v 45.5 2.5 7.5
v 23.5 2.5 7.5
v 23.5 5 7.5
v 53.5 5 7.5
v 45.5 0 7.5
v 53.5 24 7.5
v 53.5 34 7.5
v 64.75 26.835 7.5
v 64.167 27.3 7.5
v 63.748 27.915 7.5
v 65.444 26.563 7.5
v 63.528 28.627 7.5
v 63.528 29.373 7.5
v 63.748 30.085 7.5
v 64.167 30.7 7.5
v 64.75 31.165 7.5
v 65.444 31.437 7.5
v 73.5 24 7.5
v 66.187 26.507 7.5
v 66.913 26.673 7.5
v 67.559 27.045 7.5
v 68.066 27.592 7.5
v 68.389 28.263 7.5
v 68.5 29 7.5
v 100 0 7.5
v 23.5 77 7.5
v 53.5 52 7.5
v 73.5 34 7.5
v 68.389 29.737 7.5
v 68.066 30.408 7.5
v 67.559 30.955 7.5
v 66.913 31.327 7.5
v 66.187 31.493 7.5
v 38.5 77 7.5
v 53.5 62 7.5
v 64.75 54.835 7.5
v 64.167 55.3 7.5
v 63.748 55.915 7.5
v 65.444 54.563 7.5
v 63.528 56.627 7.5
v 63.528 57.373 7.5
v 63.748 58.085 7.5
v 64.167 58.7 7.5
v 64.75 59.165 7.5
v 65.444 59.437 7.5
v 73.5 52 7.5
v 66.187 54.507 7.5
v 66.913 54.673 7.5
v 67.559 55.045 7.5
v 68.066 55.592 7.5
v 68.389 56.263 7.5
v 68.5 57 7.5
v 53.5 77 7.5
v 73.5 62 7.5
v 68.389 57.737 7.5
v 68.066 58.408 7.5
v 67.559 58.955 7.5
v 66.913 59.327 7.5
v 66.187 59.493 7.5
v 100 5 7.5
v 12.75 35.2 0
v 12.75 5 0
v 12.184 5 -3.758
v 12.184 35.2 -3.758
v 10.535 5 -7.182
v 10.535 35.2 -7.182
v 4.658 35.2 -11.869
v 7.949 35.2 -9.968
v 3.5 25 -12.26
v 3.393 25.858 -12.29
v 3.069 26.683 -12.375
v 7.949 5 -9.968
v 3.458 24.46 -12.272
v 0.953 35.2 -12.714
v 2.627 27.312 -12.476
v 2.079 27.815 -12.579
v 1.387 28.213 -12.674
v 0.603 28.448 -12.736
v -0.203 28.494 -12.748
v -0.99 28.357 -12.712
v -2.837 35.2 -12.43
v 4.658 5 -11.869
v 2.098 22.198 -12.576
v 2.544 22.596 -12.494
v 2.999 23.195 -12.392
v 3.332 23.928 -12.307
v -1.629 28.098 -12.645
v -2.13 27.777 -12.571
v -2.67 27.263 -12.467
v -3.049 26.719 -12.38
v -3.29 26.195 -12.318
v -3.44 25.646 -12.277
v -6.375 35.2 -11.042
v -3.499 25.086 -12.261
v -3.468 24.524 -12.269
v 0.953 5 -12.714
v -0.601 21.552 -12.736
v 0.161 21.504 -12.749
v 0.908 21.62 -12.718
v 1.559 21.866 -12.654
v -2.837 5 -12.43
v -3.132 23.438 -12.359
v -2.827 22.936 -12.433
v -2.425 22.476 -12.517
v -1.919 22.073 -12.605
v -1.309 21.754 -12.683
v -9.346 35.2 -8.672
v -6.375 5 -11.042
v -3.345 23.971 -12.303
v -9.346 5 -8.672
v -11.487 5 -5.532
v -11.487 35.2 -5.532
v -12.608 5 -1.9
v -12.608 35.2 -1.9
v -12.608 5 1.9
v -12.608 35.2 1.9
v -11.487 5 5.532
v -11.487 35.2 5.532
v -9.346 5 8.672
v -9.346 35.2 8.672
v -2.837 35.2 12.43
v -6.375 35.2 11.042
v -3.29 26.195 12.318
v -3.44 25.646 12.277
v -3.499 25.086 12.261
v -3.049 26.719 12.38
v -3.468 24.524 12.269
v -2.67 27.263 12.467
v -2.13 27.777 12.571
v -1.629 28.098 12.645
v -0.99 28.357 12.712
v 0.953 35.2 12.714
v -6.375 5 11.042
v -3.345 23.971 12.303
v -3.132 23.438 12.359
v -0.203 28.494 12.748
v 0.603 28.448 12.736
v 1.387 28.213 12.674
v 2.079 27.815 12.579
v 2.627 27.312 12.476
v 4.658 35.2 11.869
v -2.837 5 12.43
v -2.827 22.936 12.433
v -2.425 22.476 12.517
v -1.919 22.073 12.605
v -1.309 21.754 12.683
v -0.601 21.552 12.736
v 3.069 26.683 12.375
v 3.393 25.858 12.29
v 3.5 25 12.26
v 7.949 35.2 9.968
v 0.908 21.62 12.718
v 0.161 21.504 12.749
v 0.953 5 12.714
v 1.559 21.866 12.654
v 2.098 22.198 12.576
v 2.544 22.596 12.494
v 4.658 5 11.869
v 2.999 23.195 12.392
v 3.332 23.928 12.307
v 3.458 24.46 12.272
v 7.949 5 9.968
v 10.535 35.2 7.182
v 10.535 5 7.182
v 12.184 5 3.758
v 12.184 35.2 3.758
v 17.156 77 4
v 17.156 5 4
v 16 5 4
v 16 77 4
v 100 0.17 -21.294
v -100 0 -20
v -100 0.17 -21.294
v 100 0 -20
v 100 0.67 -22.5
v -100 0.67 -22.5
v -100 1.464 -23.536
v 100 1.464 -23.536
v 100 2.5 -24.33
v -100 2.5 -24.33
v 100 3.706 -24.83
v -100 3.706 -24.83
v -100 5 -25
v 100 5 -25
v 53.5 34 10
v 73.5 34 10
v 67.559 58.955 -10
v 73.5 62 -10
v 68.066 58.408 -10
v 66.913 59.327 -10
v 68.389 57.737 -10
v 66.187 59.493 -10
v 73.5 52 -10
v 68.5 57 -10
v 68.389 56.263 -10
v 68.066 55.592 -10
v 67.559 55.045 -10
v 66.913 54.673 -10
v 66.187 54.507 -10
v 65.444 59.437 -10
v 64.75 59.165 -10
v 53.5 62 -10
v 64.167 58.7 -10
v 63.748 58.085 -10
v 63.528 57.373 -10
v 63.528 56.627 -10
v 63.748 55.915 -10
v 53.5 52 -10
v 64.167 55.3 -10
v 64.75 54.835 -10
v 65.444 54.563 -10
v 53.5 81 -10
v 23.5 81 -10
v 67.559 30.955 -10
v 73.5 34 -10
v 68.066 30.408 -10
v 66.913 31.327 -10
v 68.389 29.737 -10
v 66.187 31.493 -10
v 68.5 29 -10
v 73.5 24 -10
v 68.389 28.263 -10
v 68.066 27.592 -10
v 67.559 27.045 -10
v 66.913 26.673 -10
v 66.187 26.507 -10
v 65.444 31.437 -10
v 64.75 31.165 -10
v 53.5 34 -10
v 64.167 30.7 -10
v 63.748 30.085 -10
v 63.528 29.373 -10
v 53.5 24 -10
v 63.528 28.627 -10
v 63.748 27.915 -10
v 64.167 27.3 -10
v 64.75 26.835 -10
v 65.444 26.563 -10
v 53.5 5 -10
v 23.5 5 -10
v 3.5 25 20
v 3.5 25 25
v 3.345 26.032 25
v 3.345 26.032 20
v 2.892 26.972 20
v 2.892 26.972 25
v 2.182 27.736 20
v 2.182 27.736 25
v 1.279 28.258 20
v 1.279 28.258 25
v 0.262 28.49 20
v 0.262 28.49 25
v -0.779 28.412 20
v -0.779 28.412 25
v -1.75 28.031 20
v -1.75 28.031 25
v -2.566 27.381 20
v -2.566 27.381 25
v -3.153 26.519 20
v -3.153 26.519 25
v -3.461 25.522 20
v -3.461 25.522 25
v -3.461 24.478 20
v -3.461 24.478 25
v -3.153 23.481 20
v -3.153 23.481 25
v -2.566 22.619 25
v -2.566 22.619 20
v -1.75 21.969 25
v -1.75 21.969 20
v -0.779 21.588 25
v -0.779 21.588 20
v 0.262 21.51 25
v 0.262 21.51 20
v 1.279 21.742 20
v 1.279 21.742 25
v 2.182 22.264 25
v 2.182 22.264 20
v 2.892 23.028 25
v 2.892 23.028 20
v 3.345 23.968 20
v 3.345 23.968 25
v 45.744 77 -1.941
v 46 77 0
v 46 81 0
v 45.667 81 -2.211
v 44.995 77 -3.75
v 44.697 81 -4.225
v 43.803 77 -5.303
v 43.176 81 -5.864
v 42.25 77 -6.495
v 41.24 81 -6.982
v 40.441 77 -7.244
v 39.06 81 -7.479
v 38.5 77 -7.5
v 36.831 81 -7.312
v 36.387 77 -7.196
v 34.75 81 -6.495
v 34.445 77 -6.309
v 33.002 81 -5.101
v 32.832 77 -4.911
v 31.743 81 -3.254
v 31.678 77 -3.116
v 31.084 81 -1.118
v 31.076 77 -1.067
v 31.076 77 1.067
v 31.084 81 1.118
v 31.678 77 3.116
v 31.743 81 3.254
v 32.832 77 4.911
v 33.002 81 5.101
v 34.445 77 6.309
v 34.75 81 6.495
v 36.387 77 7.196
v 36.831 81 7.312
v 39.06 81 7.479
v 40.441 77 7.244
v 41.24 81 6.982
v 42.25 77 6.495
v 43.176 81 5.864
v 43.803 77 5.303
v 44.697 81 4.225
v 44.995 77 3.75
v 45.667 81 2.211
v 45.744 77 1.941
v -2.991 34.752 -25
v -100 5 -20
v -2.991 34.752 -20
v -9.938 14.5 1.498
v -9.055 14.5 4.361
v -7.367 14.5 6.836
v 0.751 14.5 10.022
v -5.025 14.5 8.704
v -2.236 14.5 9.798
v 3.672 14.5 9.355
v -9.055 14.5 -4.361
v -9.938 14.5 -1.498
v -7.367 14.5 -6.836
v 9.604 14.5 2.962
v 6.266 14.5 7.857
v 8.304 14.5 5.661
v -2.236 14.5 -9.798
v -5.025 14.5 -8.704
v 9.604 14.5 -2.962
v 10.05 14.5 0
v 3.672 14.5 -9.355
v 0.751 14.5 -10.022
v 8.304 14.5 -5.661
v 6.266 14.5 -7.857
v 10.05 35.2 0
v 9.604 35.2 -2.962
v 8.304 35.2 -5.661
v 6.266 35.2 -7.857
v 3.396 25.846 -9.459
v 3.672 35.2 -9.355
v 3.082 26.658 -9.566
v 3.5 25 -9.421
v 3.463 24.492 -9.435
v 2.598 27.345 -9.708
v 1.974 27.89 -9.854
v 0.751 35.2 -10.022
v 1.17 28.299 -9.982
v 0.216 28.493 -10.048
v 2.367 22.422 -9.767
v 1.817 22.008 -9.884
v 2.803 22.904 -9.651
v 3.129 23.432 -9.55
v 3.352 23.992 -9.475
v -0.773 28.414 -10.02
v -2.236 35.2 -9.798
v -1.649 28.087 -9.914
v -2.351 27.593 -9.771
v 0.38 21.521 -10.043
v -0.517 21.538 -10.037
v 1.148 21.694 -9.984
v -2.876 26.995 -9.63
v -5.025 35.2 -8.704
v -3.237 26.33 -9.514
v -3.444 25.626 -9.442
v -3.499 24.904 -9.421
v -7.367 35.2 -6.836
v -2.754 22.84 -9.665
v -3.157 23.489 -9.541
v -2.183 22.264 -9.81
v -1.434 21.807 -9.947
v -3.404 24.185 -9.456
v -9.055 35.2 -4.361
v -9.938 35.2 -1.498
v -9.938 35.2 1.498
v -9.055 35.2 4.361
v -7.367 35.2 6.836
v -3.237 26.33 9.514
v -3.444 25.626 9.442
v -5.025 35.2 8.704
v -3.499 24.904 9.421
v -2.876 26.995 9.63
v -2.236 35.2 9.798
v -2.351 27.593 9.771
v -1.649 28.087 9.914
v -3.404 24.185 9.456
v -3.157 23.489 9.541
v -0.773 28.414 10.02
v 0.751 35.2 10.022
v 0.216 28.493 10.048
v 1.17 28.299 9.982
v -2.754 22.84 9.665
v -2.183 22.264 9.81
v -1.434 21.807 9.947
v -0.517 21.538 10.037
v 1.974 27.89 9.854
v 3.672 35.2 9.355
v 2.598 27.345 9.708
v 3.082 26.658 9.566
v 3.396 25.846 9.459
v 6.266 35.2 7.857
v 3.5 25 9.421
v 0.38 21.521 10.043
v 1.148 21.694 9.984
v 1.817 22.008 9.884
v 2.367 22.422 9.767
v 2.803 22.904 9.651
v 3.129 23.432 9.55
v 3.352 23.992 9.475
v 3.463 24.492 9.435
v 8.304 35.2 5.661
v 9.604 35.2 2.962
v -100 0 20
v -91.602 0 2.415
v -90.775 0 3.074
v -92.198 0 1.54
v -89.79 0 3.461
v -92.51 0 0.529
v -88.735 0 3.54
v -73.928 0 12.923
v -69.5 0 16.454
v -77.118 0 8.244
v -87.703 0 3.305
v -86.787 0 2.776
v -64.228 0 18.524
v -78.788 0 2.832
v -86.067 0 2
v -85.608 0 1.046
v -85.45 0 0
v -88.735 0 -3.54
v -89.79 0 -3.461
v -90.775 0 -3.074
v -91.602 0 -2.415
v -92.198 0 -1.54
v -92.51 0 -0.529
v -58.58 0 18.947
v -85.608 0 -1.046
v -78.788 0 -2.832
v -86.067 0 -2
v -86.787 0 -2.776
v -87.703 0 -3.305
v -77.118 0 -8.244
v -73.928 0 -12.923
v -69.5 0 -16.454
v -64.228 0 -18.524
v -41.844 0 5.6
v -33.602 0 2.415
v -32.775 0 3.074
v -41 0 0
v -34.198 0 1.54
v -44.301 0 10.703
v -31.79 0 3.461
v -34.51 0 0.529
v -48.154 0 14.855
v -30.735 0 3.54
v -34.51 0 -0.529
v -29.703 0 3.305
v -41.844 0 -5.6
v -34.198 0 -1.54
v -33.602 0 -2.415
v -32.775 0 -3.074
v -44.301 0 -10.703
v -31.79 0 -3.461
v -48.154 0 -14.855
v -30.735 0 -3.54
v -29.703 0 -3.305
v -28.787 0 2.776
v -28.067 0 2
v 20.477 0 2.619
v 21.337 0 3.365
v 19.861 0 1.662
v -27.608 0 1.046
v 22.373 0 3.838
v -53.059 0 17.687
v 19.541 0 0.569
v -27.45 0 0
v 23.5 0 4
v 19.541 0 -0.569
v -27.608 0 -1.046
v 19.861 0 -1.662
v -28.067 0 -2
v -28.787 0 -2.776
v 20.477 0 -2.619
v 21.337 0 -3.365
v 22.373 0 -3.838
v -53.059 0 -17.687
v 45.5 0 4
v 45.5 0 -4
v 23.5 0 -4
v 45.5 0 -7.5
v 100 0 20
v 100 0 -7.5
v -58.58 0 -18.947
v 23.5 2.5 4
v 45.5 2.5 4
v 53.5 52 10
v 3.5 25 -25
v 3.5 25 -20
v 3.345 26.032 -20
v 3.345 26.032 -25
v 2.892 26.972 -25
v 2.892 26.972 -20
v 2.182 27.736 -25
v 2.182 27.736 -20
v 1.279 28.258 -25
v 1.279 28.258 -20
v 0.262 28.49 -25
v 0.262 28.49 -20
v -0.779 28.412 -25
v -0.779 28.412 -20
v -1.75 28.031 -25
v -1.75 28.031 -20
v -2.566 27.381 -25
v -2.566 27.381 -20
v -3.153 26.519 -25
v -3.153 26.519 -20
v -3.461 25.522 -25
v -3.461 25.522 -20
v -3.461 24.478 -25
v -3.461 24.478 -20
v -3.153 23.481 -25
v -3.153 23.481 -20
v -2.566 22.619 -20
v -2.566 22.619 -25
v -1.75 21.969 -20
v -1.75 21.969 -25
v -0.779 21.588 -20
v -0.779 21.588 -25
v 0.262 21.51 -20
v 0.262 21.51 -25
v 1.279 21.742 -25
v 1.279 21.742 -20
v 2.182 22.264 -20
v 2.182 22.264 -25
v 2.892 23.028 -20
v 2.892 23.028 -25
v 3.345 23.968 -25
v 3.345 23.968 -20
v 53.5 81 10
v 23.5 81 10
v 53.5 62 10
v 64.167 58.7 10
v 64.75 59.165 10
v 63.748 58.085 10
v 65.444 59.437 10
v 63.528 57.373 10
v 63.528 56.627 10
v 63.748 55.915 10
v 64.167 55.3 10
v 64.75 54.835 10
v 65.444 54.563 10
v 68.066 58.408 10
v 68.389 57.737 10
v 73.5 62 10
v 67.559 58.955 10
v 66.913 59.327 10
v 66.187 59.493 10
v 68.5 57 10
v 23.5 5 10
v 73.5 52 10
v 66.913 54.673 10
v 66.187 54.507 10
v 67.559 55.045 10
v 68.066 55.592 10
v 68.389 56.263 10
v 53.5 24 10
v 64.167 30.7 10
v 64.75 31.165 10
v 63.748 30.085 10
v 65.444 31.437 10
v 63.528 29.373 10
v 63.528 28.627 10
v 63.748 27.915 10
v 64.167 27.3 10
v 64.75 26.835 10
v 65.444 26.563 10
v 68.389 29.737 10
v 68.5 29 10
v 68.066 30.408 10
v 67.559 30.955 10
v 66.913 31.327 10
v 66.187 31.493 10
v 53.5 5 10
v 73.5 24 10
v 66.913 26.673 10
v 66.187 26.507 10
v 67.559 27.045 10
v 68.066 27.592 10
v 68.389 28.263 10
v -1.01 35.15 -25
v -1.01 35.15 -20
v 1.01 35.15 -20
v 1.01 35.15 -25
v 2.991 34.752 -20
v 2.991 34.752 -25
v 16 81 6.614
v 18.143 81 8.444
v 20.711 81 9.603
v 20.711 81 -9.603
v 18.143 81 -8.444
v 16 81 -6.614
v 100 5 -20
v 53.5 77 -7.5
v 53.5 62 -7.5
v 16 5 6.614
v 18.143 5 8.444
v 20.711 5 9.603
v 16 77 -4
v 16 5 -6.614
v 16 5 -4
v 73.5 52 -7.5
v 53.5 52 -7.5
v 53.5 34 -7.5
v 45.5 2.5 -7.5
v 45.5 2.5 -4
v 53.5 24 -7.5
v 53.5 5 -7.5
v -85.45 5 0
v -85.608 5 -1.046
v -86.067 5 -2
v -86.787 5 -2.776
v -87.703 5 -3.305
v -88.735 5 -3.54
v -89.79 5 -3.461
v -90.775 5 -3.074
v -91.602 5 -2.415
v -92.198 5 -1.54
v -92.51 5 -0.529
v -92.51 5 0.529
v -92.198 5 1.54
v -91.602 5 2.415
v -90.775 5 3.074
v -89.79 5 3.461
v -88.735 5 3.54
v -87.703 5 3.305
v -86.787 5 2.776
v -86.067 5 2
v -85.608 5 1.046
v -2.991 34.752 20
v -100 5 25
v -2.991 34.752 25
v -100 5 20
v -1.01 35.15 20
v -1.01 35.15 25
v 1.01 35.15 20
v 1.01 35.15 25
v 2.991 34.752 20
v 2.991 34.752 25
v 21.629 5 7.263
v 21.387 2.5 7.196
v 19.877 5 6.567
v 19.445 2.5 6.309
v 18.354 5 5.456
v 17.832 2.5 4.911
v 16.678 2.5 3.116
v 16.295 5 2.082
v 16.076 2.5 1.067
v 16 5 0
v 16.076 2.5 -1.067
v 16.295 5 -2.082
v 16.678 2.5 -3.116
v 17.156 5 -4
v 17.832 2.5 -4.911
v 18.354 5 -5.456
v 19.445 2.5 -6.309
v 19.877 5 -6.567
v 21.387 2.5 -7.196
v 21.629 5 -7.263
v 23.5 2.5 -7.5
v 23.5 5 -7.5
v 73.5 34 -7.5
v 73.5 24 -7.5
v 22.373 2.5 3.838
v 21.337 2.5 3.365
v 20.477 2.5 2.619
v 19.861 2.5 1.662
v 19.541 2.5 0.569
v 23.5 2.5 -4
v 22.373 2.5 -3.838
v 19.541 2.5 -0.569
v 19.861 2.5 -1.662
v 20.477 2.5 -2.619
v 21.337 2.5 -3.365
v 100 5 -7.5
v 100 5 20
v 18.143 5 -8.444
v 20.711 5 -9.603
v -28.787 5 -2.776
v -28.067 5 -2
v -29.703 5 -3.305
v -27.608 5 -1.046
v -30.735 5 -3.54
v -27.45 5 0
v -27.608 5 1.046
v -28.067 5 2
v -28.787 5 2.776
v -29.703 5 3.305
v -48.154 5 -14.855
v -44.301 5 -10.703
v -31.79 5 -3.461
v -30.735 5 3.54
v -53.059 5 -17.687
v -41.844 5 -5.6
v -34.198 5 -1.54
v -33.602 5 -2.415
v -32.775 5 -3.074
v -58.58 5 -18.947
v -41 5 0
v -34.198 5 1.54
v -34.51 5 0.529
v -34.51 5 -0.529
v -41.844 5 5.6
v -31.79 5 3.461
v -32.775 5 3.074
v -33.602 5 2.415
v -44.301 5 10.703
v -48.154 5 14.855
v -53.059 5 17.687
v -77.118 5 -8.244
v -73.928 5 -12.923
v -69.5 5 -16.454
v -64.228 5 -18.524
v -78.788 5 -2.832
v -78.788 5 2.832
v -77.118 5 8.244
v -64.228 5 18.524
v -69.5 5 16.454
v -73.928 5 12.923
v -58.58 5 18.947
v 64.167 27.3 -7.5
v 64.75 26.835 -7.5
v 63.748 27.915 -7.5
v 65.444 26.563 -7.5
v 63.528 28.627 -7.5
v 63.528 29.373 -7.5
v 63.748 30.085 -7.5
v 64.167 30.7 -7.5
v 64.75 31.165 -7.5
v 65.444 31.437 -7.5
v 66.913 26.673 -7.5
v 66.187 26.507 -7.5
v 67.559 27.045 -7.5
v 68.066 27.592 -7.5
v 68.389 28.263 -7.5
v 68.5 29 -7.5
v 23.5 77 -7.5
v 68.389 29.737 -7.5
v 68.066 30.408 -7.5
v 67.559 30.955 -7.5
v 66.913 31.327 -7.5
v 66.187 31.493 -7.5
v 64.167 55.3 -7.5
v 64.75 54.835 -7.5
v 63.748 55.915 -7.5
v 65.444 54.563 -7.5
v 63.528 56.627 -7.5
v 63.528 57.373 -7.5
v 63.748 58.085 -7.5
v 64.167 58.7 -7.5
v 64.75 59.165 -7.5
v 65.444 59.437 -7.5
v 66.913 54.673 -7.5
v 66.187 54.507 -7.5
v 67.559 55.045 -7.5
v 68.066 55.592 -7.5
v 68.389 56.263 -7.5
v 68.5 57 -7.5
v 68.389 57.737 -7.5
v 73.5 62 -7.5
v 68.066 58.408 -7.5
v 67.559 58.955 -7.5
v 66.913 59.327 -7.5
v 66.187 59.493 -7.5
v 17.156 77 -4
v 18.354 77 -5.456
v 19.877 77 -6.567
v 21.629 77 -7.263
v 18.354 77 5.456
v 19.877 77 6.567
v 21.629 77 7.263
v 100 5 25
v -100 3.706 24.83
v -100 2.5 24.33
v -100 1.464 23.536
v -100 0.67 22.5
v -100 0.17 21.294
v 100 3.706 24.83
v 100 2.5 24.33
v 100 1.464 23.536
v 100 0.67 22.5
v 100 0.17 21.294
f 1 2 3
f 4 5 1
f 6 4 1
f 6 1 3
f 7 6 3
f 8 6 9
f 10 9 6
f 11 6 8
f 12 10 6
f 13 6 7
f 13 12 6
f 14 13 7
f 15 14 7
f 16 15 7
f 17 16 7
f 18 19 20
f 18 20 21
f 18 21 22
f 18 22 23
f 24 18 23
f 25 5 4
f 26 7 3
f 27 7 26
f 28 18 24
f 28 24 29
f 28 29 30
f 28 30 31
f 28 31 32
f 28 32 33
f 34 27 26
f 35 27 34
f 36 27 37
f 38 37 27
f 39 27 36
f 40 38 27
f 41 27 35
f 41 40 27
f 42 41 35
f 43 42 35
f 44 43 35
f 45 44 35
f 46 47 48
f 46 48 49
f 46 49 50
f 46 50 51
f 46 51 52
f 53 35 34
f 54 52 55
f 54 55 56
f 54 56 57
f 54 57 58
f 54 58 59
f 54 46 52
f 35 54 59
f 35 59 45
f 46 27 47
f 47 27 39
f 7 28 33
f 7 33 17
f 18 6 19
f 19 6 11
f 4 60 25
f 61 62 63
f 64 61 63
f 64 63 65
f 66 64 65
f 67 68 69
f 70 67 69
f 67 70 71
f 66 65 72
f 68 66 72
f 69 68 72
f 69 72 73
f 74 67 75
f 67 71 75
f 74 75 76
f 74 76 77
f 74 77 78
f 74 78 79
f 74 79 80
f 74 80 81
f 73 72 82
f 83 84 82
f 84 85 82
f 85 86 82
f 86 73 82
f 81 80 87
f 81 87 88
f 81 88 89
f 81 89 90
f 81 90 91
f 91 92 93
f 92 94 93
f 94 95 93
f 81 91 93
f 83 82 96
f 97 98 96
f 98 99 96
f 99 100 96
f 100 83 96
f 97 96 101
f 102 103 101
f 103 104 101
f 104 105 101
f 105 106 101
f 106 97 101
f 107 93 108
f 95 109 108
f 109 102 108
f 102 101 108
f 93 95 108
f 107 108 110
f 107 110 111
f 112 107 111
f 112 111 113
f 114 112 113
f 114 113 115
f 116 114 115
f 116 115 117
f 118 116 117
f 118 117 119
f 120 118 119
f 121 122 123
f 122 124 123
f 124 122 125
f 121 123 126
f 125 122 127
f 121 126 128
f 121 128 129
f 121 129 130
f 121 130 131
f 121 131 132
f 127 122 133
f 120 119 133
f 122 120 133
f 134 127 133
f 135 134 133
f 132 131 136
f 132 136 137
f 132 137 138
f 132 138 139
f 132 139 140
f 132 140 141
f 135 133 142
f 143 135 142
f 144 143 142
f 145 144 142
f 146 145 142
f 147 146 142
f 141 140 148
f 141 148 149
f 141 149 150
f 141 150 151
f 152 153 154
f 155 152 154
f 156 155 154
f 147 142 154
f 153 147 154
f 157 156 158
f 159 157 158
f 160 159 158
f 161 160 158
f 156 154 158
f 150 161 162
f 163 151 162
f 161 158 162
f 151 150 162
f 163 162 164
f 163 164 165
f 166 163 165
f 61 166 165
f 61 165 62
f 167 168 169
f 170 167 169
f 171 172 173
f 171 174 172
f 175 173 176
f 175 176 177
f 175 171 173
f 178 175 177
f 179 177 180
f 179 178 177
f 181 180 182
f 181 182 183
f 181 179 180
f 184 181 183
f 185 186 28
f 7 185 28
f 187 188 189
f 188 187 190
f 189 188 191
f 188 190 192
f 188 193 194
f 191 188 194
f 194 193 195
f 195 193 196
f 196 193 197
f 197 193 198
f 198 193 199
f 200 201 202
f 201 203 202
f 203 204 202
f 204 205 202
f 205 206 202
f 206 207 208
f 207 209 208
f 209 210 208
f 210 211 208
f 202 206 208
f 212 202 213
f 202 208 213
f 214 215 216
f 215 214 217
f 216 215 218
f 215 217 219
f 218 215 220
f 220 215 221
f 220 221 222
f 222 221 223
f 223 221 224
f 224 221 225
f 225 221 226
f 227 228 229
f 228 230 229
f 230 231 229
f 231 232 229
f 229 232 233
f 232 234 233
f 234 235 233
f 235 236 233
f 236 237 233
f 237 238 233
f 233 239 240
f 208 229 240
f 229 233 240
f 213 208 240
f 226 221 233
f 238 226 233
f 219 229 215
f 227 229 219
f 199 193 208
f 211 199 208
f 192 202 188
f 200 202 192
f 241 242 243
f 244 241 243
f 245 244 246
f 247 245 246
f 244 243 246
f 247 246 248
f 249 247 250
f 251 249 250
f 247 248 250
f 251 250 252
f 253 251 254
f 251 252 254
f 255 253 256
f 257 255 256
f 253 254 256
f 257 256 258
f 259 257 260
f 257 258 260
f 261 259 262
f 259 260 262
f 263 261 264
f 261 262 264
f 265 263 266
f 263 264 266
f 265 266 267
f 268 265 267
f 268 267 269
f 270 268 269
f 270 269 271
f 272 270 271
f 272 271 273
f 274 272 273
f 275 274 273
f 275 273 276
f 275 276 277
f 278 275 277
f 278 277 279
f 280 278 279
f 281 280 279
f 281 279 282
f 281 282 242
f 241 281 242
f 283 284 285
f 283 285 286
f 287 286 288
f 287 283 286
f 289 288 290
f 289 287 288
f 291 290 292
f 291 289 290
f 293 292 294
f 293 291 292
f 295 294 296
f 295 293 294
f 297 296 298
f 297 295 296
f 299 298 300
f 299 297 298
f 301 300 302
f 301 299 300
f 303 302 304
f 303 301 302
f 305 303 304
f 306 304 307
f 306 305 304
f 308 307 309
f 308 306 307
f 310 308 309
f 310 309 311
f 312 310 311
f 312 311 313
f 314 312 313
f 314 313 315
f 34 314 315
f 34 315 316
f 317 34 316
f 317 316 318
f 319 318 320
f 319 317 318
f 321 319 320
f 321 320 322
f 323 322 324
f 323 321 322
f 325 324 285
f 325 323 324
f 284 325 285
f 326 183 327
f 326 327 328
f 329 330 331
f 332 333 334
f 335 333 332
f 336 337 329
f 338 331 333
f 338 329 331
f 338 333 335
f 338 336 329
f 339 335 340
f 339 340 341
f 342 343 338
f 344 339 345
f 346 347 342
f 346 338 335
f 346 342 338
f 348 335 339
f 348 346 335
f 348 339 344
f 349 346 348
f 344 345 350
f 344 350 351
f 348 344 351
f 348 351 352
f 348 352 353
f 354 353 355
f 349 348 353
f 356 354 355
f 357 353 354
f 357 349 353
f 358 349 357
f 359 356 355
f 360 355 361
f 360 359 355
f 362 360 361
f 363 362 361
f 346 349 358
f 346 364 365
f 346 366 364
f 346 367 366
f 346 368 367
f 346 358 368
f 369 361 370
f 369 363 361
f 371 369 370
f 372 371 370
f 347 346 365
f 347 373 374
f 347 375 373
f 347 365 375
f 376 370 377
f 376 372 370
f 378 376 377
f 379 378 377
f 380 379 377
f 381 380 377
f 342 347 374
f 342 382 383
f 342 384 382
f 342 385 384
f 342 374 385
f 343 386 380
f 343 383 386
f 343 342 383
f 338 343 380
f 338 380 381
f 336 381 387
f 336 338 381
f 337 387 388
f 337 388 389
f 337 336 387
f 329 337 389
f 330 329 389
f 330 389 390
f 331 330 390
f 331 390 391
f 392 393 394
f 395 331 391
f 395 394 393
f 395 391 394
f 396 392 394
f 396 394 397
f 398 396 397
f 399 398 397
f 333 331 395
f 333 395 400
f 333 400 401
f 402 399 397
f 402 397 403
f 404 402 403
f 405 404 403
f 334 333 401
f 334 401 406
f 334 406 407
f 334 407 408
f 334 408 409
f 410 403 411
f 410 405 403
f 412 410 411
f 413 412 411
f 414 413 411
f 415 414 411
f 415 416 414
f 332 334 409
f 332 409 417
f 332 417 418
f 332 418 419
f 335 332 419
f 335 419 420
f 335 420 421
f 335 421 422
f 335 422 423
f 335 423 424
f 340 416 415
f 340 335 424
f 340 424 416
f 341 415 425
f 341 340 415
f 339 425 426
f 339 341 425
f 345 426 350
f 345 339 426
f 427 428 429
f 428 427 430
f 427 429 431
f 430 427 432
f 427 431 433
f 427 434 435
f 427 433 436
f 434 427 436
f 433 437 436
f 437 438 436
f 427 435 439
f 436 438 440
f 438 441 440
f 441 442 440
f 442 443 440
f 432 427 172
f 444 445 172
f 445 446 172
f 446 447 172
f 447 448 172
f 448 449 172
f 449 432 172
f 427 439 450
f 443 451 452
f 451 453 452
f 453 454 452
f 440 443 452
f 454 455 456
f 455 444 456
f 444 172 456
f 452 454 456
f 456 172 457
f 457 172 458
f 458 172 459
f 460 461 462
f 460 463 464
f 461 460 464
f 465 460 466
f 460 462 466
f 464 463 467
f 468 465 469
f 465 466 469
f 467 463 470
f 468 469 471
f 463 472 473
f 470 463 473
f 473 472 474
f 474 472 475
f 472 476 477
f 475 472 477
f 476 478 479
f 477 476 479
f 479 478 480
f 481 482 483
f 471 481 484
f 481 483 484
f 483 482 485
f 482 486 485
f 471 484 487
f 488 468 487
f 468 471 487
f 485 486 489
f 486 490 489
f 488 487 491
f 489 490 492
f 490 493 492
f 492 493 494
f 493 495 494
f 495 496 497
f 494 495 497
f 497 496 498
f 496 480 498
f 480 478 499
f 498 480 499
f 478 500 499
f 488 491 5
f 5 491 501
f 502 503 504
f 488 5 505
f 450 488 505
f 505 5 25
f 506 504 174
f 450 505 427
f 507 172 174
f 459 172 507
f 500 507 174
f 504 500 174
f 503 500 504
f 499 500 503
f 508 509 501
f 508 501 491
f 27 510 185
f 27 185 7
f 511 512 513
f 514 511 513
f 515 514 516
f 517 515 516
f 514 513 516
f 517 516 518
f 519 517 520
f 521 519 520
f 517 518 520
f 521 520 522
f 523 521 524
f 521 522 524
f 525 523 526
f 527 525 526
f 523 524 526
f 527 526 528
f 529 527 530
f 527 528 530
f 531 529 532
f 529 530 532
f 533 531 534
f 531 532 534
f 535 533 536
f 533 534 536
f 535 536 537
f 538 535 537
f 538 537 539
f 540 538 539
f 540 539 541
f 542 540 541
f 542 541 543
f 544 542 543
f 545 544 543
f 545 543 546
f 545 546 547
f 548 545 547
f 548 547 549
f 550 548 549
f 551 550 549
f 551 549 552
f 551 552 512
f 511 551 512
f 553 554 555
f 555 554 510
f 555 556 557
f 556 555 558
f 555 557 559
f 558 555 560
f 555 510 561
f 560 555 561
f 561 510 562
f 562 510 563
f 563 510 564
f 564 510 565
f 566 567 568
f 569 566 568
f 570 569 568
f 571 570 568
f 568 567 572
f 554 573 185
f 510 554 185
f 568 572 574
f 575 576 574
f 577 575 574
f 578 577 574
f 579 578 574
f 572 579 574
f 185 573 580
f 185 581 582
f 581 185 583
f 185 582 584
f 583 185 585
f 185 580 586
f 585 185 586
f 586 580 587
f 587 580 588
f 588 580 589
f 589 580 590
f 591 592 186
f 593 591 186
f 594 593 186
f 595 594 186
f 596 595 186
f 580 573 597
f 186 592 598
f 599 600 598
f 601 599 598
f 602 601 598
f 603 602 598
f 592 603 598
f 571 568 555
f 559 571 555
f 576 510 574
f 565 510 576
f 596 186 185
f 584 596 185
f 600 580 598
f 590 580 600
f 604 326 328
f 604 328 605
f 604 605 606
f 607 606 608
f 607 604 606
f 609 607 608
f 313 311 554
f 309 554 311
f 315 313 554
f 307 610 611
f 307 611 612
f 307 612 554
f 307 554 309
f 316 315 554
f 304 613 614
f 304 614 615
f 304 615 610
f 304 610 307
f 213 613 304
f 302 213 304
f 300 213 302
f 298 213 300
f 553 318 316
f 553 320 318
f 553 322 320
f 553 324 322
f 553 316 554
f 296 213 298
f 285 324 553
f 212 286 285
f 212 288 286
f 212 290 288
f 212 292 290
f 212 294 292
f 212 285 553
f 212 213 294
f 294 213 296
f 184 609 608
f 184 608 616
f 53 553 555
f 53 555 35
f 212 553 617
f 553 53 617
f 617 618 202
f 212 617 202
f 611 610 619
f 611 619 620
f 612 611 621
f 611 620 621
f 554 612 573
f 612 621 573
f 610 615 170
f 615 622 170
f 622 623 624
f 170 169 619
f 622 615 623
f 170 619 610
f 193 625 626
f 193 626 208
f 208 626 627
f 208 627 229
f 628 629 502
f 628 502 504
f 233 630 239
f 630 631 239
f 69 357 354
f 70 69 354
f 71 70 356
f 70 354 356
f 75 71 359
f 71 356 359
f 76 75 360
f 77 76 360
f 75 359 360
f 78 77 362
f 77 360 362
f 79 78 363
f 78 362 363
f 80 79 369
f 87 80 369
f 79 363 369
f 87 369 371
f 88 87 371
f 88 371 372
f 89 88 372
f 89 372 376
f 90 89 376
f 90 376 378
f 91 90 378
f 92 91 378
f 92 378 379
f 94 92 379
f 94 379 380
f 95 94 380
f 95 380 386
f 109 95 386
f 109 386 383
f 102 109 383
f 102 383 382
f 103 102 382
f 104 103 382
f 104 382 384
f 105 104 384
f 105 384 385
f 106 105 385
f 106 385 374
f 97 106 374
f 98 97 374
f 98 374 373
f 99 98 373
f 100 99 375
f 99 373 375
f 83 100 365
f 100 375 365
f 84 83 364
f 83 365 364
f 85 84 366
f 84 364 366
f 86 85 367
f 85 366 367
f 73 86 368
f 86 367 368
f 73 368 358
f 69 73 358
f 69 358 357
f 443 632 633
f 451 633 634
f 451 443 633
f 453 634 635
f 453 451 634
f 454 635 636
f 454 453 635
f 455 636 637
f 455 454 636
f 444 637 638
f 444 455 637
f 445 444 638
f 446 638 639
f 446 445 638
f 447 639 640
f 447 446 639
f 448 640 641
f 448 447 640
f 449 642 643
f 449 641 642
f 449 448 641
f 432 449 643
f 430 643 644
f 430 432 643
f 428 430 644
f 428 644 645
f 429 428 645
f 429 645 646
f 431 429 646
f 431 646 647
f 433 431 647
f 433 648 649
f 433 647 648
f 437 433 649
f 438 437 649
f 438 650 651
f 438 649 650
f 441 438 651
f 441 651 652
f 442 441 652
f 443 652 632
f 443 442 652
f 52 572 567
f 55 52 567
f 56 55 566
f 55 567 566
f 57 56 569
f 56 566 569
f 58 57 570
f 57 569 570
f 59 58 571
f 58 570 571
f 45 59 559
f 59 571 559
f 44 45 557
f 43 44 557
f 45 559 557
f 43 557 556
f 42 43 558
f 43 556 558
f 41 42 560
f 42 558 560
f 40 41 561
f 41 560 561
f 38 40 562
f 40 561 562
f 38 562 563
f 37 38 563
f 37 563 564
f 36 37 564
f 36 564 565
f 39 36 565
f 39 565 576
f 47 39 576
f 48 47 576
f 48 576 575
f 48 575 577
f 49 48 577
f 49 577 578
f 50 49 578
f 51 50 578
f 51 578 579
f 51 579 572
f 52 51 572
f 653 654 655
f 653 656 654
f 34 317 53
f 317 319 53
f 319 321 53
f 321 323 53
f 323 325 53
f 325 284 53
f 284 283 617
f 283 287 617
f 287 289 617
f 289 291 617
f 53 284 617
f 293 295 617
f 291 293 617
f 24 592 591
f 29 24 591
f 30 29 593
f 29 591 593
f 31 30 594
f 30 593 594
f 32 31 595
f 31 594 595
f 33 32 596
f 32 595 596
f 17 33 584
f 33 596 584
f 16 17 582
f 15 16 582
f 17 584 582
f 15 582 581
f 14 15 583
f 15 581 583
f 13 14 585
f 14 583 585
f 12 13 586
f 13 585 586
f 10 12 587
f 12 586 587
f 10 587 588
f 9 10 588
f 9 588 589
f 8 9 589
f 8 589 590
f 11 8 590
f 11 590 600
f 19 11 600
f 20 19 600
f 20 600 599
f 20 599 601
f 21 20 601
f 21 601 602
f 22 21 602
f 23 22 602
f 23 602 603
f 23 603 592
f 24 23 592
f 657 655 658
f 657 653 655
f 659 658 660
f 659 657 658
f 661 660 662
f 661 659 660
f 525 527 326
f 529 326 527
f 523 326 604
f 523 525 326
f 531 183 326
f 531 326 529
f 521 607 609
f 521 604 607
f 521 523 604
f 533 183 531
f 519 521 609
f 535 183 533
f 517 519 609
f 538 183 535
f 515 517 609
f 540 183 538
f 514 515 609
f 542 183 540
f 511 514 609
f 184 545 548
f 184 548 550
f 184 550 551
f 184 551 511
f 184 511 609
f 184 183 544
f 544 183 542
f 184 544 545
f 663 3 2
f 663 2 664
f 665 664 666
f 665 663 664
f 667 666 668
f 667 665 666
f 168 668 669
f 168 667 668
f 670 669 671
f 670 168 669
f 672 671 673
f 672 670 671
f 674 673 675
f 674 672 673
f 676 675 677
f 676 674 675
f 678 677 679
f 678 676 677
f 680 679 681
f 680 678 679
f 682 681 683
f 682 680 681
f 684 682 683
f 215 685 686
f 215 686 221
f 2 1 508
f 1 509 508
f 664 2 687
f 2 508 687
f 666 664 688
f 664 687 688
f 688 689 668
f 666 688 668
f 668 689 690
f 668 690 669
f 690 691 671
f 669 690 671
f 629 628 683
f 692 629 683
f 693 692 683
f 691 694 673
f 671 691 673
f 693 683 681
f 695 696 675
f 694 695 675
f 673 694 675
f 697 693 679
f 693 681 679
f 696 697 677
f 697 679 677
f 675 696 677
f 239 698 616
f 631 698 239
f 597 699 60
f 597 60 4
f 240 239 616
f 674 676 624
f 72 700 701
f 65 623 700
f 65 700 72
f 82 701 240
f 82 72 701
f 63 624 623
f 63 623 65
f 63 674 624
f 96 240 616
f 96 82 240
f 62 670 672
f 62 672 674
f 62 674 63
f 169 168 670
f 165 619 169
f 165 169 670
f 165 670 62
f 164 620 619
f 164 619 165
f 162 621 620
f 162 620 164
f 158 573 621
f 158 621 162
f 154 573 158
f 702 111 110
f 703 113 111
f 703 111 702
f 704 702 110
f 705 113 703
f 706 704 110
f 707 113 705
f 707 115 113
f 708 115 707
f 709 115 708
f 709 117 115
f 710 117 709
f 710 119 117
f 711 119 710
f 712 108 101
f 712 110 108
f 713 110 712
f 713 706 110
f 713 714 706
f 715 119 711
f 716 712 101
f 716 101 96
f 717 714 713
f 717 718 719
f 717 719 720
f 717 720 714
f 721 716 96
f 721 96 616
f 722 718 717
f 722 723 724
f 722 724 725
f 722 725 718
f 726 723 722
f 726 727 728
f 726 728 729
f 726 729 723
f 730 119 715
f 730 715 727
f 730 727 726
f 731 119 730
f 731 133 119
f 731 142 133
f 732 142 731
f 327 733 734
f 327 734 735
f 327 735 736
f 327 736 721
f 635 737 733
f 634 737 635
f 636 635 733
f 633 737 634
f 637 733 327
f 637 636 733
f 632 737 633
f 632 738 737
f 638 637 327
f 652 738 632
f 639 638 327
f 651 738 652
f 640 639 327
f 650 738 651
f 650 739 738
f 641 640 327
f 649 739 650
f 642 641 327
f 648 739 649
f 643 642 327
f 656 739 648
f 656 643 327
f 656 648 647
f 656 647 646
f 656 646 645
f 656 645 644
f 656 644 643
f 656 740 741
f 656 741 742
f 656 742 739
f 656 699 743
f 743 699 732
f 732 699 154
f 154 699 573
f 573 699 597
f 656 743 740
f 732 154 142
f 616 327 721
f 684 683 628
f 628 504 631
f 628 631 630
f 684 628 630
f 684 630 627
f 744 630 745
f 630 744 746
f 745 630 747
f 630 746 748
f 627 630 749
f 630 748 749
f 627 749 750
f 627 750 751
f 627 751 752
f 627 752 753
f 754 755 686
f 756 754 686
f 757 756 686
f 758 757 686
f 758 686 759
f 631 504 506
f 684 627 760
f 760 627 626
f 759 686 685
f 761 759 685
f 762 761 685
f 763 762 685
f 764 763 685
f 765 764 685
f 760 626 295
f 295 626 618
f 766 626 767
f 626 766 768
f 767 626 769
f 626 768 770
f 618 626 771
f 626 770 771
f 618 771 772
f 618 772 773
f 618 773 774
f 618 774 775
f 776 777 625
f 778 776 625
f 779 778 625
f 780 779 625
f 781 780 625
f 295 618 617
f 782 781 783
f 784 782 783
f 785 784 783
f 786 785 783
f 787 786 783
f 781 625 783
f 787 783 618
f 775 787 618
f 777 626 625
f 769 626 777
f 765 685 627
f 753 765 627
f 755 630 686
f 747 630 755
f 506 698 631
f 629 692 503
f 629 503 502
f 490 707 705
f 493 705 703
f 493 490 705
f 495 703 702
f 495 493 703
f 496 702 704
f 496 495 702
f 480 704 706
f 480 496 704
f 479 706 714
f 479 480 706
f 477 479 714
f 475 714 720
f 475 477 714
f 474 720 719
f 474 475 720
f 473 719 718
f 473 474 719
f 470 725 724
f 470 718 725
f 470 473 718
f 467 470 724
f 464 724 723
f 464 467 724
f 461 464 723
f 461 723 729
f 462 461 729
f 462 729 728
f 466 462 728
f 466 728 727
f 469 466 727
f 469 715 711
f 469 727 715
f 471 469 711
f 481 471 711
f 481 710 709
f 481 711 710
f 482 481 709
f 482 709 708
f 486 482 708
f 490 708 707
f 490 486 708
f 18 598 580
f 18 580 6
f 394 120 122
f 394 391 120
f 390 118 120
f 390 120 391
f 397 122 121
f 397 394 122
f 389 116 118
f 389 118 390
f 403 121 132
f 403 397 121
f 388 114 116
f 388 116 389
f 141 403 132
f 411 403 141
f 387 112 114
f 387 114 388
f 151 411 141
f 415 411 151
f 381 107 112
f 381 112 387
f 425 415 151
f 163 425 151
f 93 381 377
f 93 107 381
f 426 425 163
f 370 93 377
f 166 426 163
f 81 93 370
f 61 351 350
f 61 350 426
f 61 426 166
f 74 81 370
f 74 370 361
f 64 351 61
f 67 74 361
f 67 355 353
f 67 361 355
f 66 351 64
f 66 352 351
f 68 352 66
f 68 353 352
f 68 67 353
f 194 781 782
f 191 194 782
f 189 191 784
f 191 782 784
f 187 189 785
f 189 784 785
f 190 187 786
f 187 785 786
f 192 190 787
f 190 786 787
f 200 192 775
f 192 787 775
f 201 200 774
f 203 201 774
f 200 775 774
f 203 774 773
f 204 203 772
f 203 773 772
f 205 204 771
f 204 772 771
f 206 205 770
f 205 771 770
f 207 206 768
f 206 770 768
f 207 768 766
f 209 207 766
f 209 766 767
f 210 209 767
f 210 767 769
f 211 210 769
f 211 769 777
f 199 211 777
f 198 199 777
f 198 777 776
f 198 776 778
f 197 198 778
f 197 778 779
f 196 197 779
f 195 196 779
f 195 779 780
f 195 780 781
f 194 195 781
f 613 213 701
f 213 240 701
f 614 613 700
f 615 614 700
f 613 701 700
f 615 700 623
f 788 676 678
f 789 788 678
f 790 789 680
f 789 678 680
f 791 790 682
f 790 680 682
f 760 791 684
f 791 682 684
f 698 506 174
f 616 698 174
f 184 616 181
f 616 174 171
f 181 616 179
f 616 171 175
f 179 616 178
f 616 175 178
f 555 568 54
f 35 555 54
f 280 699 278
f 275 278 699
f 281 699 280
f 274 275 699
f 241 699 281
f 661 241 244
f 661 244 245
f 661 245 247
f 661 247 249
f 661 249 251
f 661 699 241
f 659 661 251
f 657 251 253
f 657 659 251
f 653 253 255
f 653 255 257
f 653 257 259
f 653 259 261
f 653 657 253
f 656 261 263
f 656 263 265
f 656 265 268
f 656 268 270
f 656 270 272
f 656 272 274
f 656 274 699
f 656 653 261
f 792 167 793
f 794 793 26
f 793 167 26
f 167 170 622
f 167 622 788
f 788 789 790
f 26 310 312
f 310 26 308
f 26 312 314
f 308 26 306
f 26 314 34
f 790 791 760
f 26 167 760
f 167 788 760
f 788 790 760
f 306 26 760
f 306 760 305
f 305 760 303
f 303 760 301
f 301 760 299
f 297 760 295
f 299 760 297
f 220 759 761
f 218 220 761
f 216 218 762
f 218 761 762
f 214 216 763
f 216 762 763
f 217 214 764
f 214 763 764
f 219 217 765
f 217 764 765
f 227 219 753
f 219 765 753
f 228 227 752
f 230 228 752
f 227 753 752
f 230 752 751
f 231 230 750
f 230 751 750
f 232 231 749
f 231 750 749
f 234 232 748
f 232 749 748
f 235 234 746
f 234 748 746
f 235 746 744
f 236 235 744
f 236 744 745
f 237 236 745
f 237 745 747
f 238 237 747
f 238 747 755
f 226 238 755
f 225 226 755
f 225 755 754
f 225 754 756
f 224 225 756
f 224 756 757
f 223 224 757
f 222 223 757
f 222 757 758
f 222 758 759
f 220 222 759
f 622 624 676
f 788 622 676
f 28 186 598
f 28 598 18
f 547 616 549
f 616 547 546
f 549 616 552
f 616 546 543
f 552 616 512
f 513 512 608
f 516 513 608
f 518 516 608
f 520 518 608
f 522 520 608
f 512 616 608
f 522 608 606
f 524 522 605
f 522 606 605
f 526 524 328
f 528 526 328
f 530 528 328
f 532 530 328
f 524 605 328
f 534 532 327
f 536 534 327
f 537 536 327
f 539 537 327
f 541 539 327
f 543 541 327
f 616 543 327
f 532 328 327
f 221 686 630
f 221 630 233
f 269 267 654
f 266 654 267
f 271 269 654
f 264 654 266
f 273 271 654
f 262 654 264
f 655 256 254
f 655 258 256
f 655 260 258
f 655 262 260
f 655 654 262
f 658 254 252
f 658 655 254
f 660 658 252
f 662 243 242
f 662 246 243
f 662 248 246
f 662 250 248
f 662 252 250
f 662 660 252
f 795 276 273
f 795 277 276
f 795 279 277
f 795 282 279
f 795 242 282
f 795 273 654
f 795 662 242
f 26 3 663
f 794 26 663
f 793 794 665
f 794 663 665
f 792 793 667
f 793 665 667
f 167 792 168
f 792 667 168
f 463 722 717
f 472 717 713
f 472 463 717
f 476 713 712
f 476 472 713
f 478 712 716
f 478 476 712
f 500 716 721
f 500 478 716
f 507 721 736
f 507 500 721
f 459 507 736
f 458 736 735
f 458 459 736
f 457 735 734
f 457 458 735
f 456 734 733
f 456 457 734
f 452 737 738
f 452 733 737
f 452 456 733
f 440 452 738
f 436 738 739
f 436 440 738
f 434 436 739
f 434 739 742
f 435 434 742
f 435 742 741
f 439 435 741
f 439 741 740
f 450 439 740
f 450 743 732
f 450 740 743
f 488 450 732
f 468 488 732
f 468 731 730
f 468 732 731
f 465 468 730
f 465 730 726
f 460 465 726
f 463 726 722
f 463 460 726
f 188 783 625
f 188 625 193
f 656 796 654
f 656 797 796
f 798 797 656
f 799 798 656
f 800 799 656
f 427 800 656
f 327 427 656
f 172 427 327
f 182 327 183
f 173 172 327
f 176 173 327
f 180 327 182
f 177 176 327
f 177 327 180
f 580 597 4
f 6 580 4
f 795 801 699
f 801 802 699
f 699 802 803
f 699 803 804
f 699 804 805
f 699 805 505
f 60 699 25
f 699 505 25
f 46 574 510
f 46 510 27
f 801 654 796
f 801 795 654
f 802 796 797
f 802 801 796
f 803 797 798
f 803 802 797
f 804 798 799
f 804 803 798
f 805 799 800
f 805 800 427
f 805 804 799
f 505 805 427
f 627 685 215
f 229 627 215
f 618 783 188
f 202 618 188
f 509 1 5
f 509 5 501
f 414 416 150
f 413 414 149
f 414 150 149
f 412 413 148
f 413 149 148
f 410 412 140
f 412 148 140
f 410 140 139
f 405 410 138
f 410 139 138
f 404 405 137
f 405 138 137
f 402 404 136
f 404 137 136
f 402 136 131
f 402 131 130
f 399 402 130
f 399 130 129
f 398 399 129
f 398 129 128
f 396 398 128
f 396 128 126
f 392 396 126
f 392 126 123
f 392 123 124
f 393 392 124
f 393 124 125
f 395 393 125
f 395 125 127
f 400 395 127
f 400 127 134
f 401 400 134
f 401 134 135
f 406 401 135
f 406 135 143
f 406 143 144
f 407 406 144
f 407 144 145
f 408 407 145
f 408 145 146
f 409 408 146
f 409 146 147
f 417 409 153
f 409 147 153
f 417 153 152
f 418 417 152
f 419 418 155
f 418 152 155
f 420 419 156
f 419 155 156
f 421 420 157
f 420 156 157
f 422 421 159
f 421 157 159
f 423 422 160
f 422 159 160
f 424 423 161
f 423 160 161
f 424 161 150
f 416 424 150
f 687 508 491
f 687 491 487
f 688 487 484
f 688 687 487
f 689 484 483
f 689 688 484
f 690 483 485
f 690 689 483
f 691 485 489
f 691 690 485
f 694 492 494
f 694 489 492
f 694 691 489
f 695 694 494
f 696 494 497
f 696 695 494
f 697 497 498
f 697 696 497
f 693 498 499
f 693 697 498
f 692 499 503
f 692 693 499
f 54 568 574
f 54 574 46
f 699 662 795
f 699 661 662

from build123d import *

# Parameters (mm, degrees)
SKETCH2_W                       = 200
SKETCH2_H                       = 50
SKETCH2_R                       = 19
SKETCH2_R_2                     = 3.55
BOSS_EXTRUDE1_DEPTH             = 5
BOSS_EXTRUDE3_REACH             = 27
BOSS_EXTRUDE3_DIRECTION_2_REACH = 27
CUT_EXTRUDE2_DEPTH              = 20
CUT_EXTRUDE2_DEPTH_BACK         = 20
SKETCH8_R                       = 12.75
SKETCH8_R_2                     = 10.05
BOSS_EXTRUDE4_DEPTH             = 30.2
FILLET1_R                       = 5
SKETCH9_R                       = 3.5
CUT_EXTRUDE3_DEPTH              = 51
SKETCH13_R                      = 2
CUT_EXTRUDE5_DEPTH              = 2.5
CUT_EXTRUDE6_DEPTH              = 6
BOSS_EXTRUDE7_DEPTH             = 72
SKETCH17_R                      = 7.5
BOSS_EXTRUDE8_DEPTH             = 4
SKETCH18_R                      = 10.05
BOSS_EXTRUDE9_DEPTH             = 9.5
SKETCH19_W                      = 2.5
SKETCH19_H                      = 10
BOSS_EXTRUDE10_DEPTH            = 20
SKETCH20_R                      = 2.5
CUT_EXTRUDE7_DEPTH              = 36
SKETCH21_W                      = 3.5
SKETCH21_H                      = 5
CUT_EXTRUDE8_DEPTH              = 54.5


with BuildPart() as part:
    # Sketch2 → Boss-Extrude1 (new body)
    with BuildSketch(Plane(origin=(0, 0, 0), x_dir=(1, 0, 0), z_dir=(0, 1, 0))):
        Rectangle(SKETCH2_W, SKETCH2_H)
        with Locations((-60, 0)):
            Circle(SKETCH2_R, mode=Mode.SUBTRACT)
        with Locations((-31, 0)):
            Circle(SKETCH2_R_2, mode=Mode.SUBTRACT)
        with Locations((-89, 0)):
            Circle(SKETCH2_R_2, mode=Mode.SUBTRACT)
    extrude(amount=BOSS_EXTRUDE1_DEPTH)

    # Boss-Extrude3: up to this face of the body (flat: up to its plane)
    boss_extrude3_end = Plane(part.part.faces().sort_by_distance((0, 2.5, -25))[0])
    # Sketch6 → Boss-Extrude3 (add, up to the picked face)
    with BuildSketch(Plane.XY, mode=Mode.PRIVATE) as boss_extrude3_sk1:
        with BuildLine():
            Line((-100, 5), (-2.990738274, 34.75169137))
            ThreePointArc((-2.990738274, 34.75169137), (0, 35.2), (2.990738274, 34.75169137))
            Line((2.990738274, 34.75169137), (100, 5))
            Line((100, 5), (-100, 5))
        make_face()
    boss_extrude3_tool1 = split(extrude(boss_extrude3_sk1.sketch, amount=-BOSS_EXTRUDE3_REACH, mode=Mode.PRIVATE), bisect_by=boss_extrude3_end, keep=Keep.BOTH, mode=Mode.PRIVATE)
    add(boss_extrude3_tool1.solids().sort_by_distance((0, 15.216769, 0))[0])

    # Boss-Extrude3 direction 2: up to this face of the body (flat: up to its plane)
    boss_extrude3_direction_2_end = Plane(part.part.faces().sort_by_distance((0, 2.5, 25))[0])
    # Sketch6 → Boss-Extrude3 direction 2 (add, up to the picked face)
    with BuildSketch(Plane.XY, mode=Mode.PRIVATE) as boss_extrude3_direction_2_sk1:
        with BuildLine():
            Line((-100, 5), (-2.990738274, 34.75169137))
            ThreePointArc((-2.990738274, 34.75169137), (0, 35.2), (2.990738274, 34.75169137))
            Line((2.990738274, 34.75169137), (100, 5))
            Line((100, 5), (-100, 5))
        make_face()
    boss_extrude3_direction_2_tool1 = split(extrude(boss_extrude3_direction_2_sk1.sketch, amount=BOSS_EXTRUDE3_DIRECTION_2_REACH, mode=Mode.PRIVATE), bisect_by=boss_extrude3_direction_2_end, keep=Keep.BOTH, mode=Mode.PRIVATE)
    add(boss_extrude3_direction_2_tool1.solids().sort_by_distance((0, 15.216769, 0))[0])

    # Sketch7 → Cut-Extrude2 (cut, two sides)
    with BuildSketch(Plane.XY) as cut_extrude2_sk:
        with BuildLine():
            Line((2.990738274, 34.75169137), (100, 5))
            Line((100, 5), (-100, 5))
            Line((-100, 5), (-2.990738274, 34.75169137))
            ThreePointArc((-2.990738274, 34.75169137), (0, 35.2), (2.990738274, 34.75169137))
        make_face()
    extrude(amount=CUT_EXTRUDE2_DEPTH, mode=Mode.SUBTRACT)
    extrude(cut_extrude2_sk.sketch, amount=-CUT_EXTRUDE2_DEPTH_BACK, mode=Mode.SUBTRACT)

    # Sketch8 → Boss-Extrude4 (add)
    with BuildSketch(Plane(origin=(0, 5, 0), x_dir=(1, 0, 0), z_dir=(0, 1, 0))):
        Circle(SKETCH8_R)
        Circle(SKETCH8_R_2, mode=Mode.SUBTRACT)
    extrude(amount=BOSS_EXTRUDE4_DEPTH)

    # Fillet1
    fillet1_edges = [part.edges().sort_by_distance(p)[0] for p in [
        (0, 0, -25),
        (0, 0, 25),
    ]]
    fillet(fillet1_edges, radius=FILLET1_R)

    # Sketch9 → Cut-Extrude3 (cut, through all)
    with BuildSketch(Plane.XY.offset(25)):
        with Locations((0, 25)):
            Circle(SKETCH9_R)
    extrude(amount=-CUT_EXTRUDE3_DEPTH, mode=Mode.SUBTRACT)

    # Sketch13 → Cut-Extrude5 (cut)
    with BuildSketch(Plane(origin=(0, 5, 0), x_dir=(1, 0, 0), z_dir=(0, 1, 0))):
        with BuildLine():
            Line((23.5, 7.5), (53.5, 7.5))
            ThreePointArc((53.5, 7.5), (61, 0), (53.5, -7.5))
            Line((53.5, -7.5), (23.5, -7.5))
            ThreePointArc((23.5, -7.5), (16, 0), (23.5, 7.5))
        make_face()
        with Locations((31.5, 0)):
            Circle(SKETCH13_R, mode=Mode.SUBTRACT)
        with Locations((24.5, 0)):
            Circle(SKETCH13_R, mode=Mode.SUBTRACT)
        with Locations((38.5, 0)):
            Circle(SKETCH13_R, mode=Mode.SUBTRACT)
        with Locations((45.5, 0)):
            Circle(SKETCH13_R, mode=Mode.SUBTRACT)
        with Locations((52.5, 0)):
            Circle(SKETCH13_R, mode=Mode.SUBTRACT)
    extrude(amount=-CUT_EXTRUDE5_DEPTH, mode=Mode.SUBTRACT)

    # Sketch15 → Cut-Extrude6 (cut, through all)
    with BuildSketch(Plane(origin=(0, 5, 0), x_dir=(1, 0, 0), z_dir=(0, 1, 0))):
        with BuildLine():
            Line((23.5, 4), (53.5, 4))
            Line((53.5, 4), (100, 4))
            Line((100, 4), (100, -4))
            Line((100, -4), (53.5, -4))
            Line((53.5, -4), (23.5, -4))
            ThreePointArc((23.5, -4), (19.5, 0), (23.5, 4))
        make_face()
    extrude(amount=-CUT_EXTRUDE6_DEPTH, mode=Mode.SUBTRACT)

    # Sketch16 → Boss-Extrude7 (add)
    with BuildSketch(Plane(origin=(0, 5, 0), x_dir=(1, 0, 0), z_dir=(0, 1, 0))):
        with BuildLine():
            Line((16, -4), (16, -6.614378278))
            ThreePointArc((16, -6.614378278), (19.385621722, -9.114378278), (23.5, -10))
            Line((23.5, -10), (53.5, -10))
            Line((53.5, -10), (53.5, -7.5))
            Line((53.5, -7.5), (23.5, -7.5))
            ThreePointArc((23.5, -7.5), (19.877155813, -6.566962768), (17.15571123, -4))
            Line((17.15571123, -4), (16, -4))
        make_face()
        with BuildLine():
            Line((53.5, 10), (23.5, 10))
            ThreePointArc((23.5, 10), (19.385621722, 9.114378278), (16, 6.614378278))
            Line((16, 6.614378278), (16, 4))
            Line((16, 4), (17.15571123, 4))
            ThreePointArc((17.15571123, 4), (19.877155813, 6.566962768), (23.5, 7.5))
            Line((23.5, 7.5), (53.5, 7.5))
            Line((53.5, 7.5), (53.5, 10))
        make_face()
    extrude(amount=BOSS_EXTRUDE7_DEPTH)

    # Sketch17 → Boss-Extrude8 (add)
    with BuildSketch(Plane(origin=(0, 77, 0), x_dir=(1, 0, 0), z_dir=(0, 1, 0))):
        with BuildLine():
            Line((23.5, -10), (53.5, -10))
            Line((53.5, -10), (53.5, 10))
            Line((53.5, 10), (23.5, 10))
            ThreePointArc((23.5, 10), (19.385621722, 9.114378278), (16, 6.614378278))
            Line((16, 6.614378278), (16, 4))
            Line((16, 4), (16, -4))
            Line((16, -4), (16, -6.614378278))
            ThreePointArc((16, -6.614378278), (19.385621722, -9.114378278), (23.5, -10))
        make_face()
        with Locations((38.5, 0)):
            Circle(SKETCH17_R, mode=Mode.SUBTRACT)
    extrude(amount=BOSS_EXTRUDE8_DEPTH)

    # Sketch18 → Boss-Extrude9 (add)
    with BuildSketch(Plane(origin=(0, 5, 0), x_dir=(1, 0, 0), z_dir=(0, 1, 0))):
        Circle(SKETCH18_R)
    extrude(amount=BOSS_EXTRUDE9_DEPTH)

    # Sketch19 → Boss-Extrude10 (add)
    with BuildSketch(Plane(origin=(53.5, 0, 0), x_dir=(0, 0, -1), z_dir=(1, 0, 0))):
        with Locations((-8.75, 57)):
            Rectangle(SKETCH19_W, SKETCH19_H)
        with Locations((8.75, 57)):
            Rectangle(SKETCH19_W, SKETCH19_H)
        with Locations((8.75, 29)):
            Rectangle(SKETCH19_W, SKETCH19_H)
        with Locations((-8.75, 29)):
            Rectangle(SKETCH19_W, SKETCH19_H)
    extrude(amount=BOSS_EXTRUDE10_DEPTH)

    # Sketch20 → Cut-Extrude7 (cut, through all)
    with BuildSketch(Plane.XY.offset(10)):
        with Locations((66, 57)):
            Circle(SKETCH20_R)
        with Locations((66, 29)):
            Circle(SKETCH20_R)
    extrude(amount=-CUT_EXTRUDE7_DEPTH, mode=Mode.SUBTRACT)

    # Sketch21 → Cut-Extrude8 (cut)
    with BuildSketch(Plane(origin=(100, 0, 0), x_dir=(0, 0, -1), z_dir=(1, 0, 0))):
        with Locations((-5.75, 2.5)):
            Rectangle(SKETCH21_W, SKETCH21_H)
        with Locations((5.75, 2.5)):
            Rectangle(SKETCH21_W, SKETCH21_H)
    extrude(amount=-CUT_EXTRUDE8_DEPTH, mode=Mode.SUBTRACT)


solid = part.part
